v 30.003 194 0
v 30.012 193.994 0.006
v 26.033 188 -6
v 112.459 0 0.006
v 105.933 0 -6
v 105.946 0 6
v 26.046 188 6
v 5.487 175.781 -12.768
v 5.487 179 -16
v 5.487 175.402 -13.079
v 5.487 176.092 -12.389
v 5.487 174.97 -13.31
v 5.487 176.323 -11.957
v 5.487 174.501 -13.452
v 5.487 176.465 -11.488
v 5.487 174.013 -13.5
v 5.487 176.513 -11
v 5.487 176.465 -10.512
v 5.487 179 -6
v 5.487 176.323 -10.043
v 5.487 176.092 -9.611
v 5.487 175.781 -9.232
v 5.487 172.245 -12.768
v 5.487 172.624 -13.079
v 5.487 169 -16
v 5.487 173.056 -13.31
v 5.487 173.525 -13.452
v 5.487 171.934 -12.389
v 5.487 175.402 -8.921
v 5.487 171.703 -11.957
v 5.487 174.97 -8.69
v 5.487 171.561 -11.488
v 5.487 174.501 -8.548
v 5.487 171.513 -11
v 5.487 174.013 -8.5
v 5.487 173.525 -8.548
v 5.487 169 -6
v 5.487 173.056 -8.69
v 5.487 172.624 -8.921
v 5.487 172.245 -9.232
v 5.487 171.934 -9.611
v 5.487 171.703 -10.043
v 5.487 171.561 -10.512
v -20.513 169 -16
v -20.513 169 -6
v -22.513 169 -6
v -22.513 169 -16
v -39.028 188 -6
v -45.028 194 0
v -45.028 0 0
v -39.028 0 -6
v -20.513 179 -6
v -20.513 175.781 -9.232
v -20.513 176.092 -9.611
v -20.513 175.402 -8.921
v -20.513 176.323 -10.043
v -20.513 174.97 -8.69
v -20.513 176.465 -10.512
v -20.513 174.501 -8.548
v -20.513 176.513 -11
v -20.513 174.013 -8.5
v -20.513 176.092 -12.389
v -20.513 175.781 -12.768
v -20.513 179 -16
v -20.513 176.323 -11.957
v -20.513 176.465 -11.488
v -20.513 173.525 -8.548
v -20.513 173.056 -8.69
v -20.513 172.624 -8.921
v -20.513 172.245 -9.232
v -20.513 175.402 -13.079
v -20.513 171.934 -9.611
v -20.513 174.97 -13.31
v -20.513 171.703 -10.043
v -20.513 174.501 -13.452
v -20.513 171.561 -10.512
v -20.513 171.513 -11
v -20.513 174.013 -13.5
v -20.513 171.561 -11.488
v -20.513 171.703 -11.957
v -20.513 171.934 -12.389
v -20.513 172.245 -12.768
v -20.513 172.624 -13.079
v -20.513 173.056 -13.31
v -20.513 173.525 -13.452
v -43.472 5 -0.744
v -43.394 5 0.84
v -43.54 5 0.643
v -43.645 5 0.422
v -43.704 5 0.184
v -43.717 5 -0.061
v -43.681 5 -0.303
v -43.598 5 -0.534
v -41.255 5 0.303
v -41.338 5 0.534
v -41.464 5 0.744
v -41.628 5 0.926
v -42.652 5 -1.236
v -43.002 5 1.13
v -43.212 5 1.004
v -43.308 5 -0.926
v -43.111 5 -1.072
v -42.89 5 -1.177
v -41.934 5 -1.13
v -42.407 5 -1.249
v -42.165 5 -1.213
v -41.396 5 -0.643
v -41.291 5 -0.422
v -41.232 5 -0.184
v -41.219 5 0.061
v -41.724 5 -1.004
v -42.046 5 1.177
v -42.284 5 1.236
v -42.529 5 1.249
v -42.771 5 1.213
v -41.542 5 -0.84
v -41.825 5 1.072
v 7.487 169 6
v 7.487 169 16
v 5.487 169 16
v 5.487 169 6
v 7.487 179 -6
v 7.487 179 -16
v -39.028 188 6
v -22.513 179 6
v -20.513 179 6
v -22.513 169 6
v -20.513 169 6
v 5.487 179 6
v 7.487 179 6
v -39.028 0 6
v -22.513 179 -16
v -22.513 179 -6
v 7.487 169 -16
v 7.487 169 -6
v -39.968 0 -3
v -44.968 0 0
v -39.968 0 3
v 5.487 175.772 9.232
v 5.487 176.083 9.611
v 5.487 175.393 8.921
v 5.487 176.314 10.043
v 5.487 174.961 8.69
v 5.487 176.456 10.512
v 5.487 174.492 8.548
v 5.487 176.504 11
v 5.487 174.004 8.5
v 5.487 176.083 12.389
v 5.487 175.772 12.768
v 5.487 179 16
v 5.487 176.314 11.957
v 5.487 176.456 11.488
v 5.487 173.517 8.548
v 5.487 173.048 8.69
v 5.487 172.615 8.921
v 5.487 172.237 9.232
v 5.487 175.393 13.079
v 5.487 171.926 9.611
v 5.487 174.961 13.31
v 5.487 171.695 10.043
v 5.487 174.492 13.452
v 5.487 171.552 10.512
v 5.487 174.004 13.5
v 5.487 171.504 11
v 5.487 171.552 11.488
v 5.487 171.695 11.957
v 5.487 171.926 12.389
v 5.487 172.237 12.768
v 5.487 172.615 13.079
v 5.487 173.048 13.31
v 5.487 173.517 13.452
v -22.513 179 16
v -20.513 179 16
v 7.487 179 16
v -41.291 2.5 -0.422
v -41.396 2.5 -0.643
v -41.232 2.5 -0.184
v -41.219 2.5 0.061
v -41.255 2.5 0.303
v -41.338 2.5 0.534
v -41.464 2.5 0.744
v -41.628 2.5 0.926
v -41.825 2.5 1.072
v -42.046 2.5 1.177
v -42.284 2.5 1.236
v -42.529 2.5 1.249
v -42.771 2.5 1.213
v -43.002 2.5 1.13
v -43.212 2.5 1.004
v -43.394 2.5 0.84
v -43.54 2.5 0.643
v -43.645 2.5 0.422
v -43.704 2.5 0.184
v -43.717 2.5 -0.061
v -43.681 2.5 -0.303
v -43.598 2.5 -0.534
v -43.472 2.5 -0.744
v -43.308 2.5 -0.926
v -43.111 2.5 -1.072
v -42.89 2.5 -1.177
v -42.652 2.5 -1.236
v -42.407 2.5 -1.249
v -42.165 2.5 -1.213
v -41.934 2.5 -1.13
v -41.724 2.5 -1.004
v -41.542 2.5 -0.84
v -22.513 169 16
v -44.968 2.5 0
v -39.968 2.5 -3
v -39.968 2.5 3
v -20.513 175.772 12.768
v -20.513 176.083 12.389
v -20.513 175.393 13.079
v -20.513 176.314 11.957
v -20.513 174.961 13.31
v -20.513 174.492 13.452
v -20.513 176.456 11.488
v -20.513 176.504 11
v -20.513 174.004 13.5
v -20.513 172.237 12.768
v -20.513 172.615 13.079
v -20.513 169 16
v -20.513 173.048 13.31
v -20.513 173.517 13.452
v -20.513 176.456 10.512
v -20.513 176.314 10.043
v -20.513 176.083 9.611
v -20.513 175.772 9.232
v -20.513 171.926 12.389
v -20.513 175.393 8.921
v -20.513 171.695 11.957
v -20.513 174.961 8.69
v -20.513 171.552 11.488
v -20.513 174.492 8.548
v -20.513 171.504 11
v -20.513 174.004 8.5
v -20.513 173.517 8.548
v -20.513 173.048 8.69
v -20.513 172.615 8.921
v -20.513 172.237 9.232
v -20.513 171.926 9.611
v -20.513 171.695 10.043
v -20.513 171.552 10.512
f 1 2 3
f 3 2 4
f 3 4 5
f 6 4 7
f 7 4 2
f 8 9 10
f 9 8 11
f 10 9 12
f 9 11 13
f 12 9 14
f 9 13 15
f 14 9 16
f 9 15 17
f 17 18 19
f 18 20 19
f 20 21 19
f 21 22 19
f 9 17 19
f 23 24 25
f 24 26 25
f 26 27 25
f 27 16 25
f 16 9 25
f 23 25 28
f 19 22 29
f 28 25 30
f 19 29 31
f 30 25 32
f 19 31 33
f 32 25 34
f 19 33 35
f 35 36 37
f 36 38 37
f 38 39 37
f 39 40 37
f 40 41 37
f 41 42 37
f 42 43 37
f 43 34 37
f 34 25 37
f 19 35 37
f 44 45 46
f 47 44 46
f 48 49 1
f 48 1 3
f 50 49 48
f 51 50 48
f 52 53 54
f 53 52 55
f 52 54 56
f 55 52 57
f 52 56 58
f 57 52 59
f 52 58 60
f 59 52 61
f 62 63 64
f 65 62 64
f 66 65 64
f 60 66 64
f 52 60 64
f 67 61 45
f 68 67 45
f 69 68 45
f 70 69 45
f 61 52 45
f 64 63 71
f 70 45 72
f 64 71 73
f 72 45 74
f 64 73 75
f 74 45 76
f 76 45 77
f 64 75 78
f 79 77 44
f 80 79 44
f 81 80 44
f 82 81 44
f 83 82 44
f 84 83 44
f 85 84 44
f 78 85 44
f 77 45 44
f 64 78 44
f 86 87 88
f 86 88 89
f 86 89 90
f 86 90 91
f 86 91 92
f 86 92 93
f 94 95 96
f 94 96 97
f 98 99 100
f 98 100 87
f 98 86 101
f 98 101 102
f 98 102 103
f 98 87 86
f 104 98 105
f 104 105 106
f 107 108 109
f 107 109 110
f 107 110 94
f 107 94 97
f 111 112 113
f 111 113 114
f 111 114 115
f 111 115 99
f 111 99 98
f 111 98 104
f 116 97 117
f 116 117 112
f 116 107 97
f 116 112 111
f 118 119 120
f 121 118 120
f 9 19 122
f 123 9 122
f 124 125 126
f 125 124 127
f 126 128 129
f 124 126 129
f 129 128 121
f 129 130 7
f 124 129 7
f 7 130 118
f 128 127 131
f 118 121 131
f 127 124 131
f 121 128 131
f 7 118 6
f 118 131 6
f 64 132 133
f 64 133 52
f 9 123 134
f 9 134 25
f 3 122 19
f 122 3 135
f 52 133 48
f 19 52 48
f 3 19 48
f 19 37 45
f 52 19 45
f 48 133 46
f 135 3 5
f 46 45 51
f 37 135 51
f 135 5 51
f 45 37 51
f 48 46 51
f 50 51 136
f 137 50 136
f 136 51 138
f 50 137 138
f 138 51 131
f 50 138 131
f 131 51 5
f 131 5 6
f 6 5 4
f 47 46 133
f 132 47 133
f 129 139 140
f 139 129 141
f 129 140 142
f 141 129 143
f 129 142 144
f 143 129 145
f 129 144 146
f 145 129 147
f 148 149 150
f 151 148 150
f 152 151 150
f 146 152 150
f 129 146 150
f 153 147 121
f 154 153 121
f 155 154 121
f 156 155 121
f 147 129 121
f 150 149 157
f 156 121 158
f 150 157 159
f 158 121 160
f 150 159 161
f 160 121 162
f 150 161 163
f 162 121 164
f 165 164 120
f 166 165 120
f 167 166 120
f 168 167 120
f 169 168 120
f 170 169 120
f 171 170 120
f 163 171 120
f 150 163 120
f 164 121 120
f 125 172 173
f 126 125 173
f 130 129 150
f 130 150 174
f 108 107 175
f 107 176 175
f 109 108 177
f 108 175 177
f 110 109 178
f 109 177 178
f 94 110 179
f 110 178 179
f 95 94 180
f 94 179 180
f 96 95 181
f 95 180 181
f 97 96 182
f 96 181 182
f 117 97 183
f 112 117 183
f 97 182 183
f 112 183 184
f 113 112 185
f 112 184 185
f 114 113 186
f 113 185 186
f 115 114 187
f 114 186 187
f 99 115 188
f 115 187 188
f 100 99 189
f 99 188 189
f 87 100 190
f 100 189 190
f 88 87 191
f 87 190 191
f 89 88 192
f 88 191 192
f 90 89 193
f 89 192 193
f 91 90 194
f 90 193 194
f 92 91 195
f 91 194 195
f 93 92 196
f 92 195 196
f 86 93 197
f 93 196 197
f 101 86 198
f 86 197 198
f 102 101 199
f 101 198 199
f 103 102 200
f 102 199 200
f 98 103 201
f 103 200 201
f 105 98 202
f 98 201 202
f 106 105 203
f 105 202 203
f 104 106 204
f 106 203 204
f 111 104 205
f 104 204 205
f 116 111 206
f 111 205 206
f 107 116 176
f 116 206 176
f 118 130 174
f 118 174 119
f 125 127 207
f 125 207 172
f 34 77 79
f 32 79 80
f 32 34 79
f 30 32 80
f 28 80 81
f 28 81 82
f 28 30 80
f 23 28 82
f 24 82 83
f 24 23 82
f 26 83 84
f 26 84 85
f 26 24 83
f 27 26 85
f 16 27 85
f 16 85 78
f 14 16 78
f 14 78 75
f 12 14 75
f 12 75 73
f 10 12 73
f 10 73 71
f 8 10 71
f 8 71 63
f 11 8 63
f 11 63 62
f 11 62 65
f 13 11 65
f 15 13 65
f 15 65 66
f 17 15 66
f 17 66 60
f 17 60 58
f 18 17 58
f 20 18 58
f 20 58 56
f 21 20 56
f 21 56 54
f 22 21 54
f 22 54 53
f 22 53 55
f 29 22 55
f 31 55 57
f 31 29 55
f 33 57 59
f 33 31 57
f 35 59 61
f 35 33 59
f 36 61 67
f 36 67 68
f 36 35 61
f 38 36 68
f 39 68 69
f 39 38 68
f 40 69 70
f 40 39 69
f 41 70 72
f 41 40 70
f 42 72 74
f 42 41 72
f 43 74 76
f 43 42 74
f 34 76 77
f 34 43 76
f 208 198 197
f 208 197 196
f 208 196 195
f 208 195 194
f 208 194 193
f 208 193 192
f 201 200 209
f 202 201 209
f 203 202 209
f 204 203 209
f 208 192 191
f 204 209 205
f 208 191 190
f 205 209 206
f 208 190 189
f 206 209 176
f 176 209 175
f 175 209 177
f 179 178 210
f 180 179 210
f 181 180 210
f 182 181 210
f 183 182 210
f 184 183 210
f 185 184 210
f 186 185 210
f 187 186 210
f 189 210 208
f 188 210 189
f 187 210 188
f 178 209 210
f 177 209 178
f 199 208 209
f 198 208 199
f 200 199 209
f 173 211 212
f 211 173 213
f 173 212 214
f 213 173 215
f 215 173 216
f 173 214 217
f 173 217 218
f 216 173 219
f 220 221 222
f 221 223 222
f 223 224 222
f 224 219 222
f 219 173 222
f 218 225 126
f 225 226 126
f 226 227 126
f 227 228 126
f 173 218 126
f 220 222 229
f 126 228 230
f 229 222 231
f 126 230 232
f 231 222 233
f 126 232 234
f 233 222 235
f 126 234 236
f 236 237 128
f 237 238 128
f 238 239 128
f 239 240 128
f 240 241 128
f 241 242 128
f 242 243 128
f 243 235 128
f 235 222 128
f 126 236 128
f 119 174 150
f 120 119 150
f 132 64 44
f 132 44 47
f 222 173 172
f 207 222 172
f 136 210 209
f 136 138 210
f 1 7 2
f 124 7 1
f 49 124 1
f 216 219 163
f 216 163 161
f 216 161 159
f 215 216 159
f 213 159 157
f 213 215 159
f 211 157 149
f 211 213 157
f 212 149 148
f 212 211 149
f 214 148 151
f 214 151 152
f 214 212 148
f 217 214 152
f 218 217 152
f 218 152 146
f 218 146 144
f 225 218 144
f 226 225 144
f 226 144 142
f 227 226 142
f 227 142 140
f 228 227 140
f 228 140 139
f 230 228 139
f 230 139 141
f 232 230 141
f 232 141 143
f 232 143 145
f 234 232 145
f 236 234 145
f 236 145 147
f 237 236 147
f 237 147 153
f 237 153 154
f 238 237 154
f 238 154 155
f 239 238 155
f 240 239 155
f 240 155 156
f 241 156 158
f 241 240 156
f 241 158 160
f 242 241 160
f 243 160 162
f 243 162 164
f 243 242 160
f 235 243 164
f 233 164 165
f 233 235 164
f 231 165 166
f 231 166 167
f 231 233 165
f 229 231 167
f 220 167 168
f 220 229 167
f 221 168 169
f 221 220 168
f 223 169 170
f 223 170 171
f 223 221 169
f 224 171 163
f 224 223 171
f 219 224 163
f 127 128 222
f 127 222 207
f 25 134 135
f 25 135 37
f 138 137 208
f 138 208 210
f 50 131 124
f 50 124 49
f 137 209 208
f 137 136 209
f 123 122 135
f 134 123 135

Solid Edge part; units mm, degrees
sketch "Sketch1" plane through (0, 0, 0) normal (0, -1, 0) x (1, 0, 0)
  line L0 (-51.028, 6) -> (118.972, 6)
  line L1 (118.972, 6) -> (118.972, -6)
  line L2 (118.972, -6) -> (-51.028, -6)
  line L3 (-51.028, -6) -> (-51.028, 6)
extrude "Protrusion1" add sketch "Sketch1" against normal blind 200
sketch "Sketch2" plane through (33.972, 100, 6) normal (0, 0, 1) x (0, 1, 0)
  line L0 (-100, -85) -> (100, 0)
extrude "ExtrudedCutout_3" cut sketch "Sketch2" against normal blind 139.4118 material side at (76.518, 100.0196, 6)
sketch "Sketch3" plane through (33.972, 0, 0) normal (0, -1, 0) x (1, 0, 0)
  line L0 (-73.94, 3) -> (-73.94, -3)
  line L1 (-73.94, -3) -> (-78.94, 0)
  line L2 (-78.94, 0) -> (-73.94, 3)
extrude "ExtrudedCutout_4" cut sketch "Sketch3" against normal blind 2.5
sketch "Sketch4" plane through (-42.468, 2.5, 0) normal (0, -1, 0) x (0.8574929, 0, -0.5144958)
  circle A0 centre (0, 0) radius 1.25
extrude "ExtrudedCutout_5" cut sketch "Sketch4" against normal blind 2.5
chamfer "Chamfer_6" distance 12 angle 45 2 edges at (76.472, 100, 6) (76.472, 100, -6)
chamfer "Chamfer_7" distance 12 angle 45 2 edges at (-15.0474, 200, 6) (-15.0474, 200, -6)
chamfer "Chamfer_8" distance 12 angle 45 2 edges at (-51.028, 94, 6) (-51.028, 94, -6)
sketch "Sketch5" plane through (33.4526, 94, 6) normal (0, 0, 1) x (1, 0, 0)
  line L0 (-55.9653, 75) -> (-55.9653, 85)
  line L1 (-55.9653, 85) -> (-25.9653, 85)
  line L2 (-25.9653, 85) -> (-25.9653, 75)
  line L3 (-25.9653, 75) -> (-55.9653, 75)
extrude "ExtrudedProtrusion_2" add sketch "Sketch5" along normal blind 10
sketch "Sketch6" plane through (-7.5127, 174, 16) normal (0, 0, 1) x (0, -1, 0)
  line L0 (3, 13) -> (3, -13)
  line L1 (3, -13) -> (-3, -13)
  line L2 (-3, -13) -> (-3, 13)
  line L3 (-3, 13) -> (3, 13)
extrude "ExtrudedCutout_6" cut sketch "Sketch6" against normal blind 10
sketch "Sketch7" plane through (-7.5127, 169, 11) normal (0, -1, 0) x (1, 0, 0)
  line L0 (13, 5) -> (-13, 5)
  line L1 (-13, 5) -> (-13, -5)
  line L2 (-13, -5) -> (13, -5)
  line L3 (13, -5) -> (13, 5)
extrude "ExtrudedCutout_7" cut sketch "Sketch7" against normal blind 74.3913
sketch "Sketch8" plane through (-22.5127, 174, 11) normal (-1, 0, 0) x (0, 0, 1)
  circle A0 centre (0, 0.0043) radius 2.5
extrude "ExtrudedProtrusion_3" add sketch "Sketch8" against normal blind 30
sketch "Sketch9" plane through (33.4526, 94, -6) normal (0, 0, -1) x (0, -1, 0)
  line L0 (-75, 25.9653) -> (-75, 55.9653)
  line L1 (-75, 55.9653) -> (-85, 55.9653)
  line L2 (-85, 55.9653) -> (-85, 25.9653)
  line L3 (-85, 25.9653) -> (-75, 25.9653)
extrude "ExtrudedProtrusion_4" add sketch "Sketch9" along normal blind 10
sketch "Sketch10" plane through (-7.5127, 174, -16) normal (0, 0, -1) x (0, -1, 0)
  line L0 (3, 13) -> (3, -13)
  line L1 (3, -13) -> (-3, -13)
  line L2 (-3, -13) -> (-3, 13)
  line L3 (-3, 13) -> (3, 13)
extrude "ExtrudedCutout_8" cut sketch "Sketch10" against normal blind 10
sketch "Sketch11" plane through (-7.5127, 169, -11) normal (0, -1, 0) x (-1, 0, 0)
  line L0 (13, -5) -> (13, 5)
  line L1 (13, 5) -> (-13, 5)
  line L2 (-13, 5) -> (-13, -5)
  line L3 (-13, -5) -> (13, -5)
extrude "ExtrudedCutout_9" cut sketch "Sketch11" against normal blind 63.7018
sketch "Sketch12" plane through (7.4873, 174, -11) normal (1, 0, 0) x (0, -1, 0)
  circle A0 centre (-0.013, 0) radius 2.5
extrude "ExtrudedProtrusion_5" add sketch "Sketch12" against normal blind 30
